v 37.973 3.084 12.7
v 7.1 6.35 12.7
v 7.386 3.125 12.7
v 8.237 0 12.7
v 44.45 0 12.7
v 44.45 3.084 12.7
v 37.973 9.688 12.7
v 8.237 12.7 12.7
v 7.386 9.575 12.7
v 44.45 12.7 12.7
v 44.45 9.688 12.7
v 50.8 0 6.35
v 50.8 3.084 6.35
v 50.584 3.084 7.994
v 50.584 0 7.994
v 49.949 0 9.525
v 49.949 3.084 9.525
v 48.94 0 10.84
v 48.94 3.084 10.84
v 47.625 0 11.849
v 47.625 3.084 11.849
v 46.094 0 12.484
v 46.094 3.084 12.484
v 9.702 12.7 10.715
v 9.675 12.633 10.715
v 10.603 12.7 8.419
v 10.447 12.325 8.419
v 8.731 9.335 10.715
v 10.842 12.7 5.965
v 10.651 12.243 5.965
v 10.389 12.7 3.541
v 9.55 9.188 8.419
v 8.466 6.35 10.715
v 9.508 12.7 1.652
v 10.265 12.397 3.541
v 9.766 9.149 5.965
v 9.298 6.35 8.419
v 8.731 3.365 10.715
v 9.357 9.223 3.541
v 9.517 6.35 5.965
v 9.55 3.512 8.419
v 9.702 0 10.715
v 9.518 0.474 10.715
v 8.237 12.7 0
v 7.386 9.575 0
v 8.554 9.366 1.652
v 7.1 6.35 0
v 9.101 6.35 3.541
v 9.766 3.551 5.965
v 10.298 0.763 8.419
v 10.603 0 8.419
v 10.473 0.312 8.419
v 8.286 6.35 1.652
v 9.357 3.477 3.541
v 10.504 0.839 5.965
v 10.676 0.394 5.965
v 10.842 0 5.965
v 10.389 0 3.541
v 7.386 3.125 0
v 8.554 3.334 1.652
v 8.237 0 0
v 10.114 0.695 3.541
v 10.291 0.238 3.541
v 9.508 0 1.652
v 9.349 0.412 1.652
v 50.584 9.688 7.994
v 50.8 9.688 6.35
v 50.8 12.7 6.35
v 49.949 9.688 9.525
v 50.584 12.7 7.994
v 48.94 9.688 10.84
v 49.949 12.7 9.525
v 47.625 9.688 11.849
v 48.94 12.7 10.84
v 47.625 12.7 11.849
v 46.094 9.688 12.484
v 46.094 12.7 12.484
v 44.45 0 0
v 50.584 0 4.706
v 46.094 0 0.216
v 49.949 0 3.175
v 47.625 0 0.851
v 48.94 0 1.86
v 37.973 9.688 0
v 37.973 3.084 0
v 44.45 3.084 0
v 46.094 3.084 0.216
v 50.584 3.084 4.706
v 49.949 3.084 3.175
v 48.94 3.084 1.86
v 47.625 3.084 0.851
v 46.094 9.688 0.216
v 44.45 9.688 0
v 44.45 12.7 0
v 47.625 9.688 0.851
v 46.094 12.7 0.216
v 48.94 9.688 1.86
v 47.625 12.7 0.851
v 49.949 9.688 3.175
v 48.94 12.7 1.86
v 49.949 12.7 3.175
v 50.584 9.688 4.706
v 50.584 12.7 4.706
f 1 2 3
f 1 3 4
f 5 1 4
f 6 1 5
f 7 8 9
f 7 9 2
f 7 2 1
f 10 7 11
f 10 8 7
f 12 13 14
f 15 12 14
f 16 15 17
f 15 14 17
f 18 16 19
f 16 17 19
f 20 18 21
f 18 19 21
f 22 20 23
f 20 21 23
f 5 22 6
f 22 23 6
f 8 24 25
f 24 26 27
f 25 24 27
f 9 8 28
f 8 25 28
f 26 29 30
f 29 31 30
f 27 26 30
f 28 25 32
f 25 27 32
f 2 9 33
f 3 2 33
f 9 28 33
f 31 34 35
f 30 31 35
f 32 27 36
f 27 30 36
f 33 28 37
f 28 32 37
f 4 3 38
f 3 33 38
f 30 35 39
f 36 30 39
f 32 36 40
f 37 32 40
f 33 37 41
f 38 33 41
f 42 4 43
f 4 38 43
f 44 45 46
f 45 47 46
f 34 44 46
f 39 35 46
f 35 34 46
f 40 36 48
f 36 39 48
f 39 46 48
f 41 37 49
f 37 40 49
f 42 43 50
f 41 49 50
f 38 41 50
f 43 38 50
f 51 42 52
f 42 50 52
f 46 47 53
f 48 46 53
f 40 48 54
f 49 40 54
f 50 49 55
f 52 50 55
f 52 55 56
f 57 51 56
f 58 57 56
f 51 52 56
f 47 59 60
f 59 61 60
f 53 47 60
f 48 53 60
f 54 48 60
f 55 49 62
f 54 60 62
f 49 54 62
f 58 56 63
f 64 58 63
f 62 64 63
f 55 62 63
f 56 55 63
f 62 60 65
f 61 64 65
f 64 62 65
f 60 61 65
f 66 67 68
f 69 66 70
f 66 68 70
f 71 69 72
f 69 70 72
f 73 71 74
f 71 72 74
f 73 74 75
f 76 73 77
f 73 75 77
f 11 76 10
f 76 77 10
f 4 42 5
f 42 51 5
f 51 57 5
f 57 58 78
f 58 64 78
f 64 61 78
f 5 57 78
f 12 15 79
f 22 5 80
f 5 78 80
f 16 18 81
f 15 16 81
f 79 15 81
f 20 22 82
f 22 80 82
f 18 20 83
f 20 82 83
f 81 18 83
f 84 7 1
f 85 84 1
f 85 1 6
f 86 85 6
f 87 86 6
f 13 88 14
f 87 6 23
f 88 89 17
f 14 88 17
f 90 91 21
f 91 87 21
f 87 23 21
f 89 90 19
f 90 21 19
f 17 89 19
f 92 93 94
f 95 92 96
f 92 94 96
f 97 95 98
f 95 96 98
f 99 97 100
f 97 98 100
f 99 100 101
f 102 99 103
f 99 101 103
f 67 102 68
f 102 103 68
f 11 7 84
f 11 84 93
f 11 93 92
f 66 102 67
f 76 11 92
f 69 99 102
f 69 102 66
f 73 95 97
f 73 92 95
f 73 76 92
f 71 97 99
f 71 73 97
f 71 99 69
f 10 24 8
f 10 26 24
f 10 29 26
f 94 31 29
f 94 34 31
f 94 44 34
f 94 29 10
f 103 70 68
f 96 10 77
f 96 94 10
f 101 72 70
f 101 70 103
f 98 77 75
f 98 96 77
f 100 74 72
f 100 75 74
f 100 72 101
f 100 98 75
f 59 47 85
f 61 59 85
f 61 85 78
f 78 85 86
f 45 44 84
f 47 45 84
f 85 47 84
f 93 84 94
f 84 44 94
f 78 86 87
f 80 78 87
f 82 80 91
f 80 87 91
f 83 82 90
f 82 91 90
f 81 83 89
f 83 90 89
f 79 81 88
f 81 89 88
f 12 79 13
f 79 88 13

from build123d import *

# Parameters (mm, degrees)
F0_W          = 50.8
F0_H          = 12.7
F1_DEPTH      = 12.7
F6_R          = 9.525
F7_ANGLE_BACK = 30
F7_ANGLE      = 60
F9_DEPTH      = 25.4
F10_W         = 12.827
F10_H         = 3.302
F11_DEPTH     = 25.4


with BuildPart() as f1:
    # F0 (on Top) → F1 (new body)
    with BuildSketch(Plane.XY):
        with Locations((25.4, 6.35)):
            Rectangle(F0_W, F0_H)
    extrude(amount=F1_DEPTH)

    # F6 (on 3pt) → F7 (revolve, cut)
    with BuildSketch(Plane(origin=(0, 6.35, 0), x_dir=(-1, 0, 0), z_dir=(0, 1, 0)), mode=Mode.PRIVATE) as f7_sk:
        with Locations((0, 6.35)):
            Circle(F6_R)
    revolve(f7_sk.sketch.rotate(Axis((25.4, 6.35, 6.3316160813), (0, 0, 1)), -F7_ANGLE_BACK), axis=Axis((25.4, 6.35, 6.3316160813), (0, 0, 1)), revolution_arc=F7_ANGLE, mode=Mode.SUBTRACT)

    # F8 (on face) → F9 (cut)
    with BuildSketch(Plane(origin=(0, 12.7, 0), x_dir=(-1, 0, 0), z_dir=(0, 1, 0))):
        with BuildLine():
            ThreePointArc((-50.8, 6.35), (-48.9401280605, 10.8401280605), (-44.45, 12.7))
            Line((-44.45, 12.7), (-50.8, 12.7))
            Line((-50.8, 12.7), (-50.8, 6.35))
        make_face()
        with BuildLine():
            ThreePointArc((-44.45, 0), (-48.9401280605, 1.8598719395), (-50.8, 6.35))
            Line((-50.8, 6.35), (-50.8, 0))
            Line((-50.8, 0), (-44.45, 0))
        make_face()
    extrude(amount=-F9_DEPTH, mode=Mode.SUBTRACT)

    # F10 (on face) → F11 (cut)
    with BuildSketch(Plane.XY.offset(12.7)):
        with Locations((44.3865, 4.7349631403)):
            Rectangle(F10_W, F10_H)
        with Locations((44.3865, 8.0369631403)):
            Rectangle(F10_W, F10_H)
    extrude(amount=-F11_DEPTH, mode=Mode.SUBTRACT)


solid = f1.part
